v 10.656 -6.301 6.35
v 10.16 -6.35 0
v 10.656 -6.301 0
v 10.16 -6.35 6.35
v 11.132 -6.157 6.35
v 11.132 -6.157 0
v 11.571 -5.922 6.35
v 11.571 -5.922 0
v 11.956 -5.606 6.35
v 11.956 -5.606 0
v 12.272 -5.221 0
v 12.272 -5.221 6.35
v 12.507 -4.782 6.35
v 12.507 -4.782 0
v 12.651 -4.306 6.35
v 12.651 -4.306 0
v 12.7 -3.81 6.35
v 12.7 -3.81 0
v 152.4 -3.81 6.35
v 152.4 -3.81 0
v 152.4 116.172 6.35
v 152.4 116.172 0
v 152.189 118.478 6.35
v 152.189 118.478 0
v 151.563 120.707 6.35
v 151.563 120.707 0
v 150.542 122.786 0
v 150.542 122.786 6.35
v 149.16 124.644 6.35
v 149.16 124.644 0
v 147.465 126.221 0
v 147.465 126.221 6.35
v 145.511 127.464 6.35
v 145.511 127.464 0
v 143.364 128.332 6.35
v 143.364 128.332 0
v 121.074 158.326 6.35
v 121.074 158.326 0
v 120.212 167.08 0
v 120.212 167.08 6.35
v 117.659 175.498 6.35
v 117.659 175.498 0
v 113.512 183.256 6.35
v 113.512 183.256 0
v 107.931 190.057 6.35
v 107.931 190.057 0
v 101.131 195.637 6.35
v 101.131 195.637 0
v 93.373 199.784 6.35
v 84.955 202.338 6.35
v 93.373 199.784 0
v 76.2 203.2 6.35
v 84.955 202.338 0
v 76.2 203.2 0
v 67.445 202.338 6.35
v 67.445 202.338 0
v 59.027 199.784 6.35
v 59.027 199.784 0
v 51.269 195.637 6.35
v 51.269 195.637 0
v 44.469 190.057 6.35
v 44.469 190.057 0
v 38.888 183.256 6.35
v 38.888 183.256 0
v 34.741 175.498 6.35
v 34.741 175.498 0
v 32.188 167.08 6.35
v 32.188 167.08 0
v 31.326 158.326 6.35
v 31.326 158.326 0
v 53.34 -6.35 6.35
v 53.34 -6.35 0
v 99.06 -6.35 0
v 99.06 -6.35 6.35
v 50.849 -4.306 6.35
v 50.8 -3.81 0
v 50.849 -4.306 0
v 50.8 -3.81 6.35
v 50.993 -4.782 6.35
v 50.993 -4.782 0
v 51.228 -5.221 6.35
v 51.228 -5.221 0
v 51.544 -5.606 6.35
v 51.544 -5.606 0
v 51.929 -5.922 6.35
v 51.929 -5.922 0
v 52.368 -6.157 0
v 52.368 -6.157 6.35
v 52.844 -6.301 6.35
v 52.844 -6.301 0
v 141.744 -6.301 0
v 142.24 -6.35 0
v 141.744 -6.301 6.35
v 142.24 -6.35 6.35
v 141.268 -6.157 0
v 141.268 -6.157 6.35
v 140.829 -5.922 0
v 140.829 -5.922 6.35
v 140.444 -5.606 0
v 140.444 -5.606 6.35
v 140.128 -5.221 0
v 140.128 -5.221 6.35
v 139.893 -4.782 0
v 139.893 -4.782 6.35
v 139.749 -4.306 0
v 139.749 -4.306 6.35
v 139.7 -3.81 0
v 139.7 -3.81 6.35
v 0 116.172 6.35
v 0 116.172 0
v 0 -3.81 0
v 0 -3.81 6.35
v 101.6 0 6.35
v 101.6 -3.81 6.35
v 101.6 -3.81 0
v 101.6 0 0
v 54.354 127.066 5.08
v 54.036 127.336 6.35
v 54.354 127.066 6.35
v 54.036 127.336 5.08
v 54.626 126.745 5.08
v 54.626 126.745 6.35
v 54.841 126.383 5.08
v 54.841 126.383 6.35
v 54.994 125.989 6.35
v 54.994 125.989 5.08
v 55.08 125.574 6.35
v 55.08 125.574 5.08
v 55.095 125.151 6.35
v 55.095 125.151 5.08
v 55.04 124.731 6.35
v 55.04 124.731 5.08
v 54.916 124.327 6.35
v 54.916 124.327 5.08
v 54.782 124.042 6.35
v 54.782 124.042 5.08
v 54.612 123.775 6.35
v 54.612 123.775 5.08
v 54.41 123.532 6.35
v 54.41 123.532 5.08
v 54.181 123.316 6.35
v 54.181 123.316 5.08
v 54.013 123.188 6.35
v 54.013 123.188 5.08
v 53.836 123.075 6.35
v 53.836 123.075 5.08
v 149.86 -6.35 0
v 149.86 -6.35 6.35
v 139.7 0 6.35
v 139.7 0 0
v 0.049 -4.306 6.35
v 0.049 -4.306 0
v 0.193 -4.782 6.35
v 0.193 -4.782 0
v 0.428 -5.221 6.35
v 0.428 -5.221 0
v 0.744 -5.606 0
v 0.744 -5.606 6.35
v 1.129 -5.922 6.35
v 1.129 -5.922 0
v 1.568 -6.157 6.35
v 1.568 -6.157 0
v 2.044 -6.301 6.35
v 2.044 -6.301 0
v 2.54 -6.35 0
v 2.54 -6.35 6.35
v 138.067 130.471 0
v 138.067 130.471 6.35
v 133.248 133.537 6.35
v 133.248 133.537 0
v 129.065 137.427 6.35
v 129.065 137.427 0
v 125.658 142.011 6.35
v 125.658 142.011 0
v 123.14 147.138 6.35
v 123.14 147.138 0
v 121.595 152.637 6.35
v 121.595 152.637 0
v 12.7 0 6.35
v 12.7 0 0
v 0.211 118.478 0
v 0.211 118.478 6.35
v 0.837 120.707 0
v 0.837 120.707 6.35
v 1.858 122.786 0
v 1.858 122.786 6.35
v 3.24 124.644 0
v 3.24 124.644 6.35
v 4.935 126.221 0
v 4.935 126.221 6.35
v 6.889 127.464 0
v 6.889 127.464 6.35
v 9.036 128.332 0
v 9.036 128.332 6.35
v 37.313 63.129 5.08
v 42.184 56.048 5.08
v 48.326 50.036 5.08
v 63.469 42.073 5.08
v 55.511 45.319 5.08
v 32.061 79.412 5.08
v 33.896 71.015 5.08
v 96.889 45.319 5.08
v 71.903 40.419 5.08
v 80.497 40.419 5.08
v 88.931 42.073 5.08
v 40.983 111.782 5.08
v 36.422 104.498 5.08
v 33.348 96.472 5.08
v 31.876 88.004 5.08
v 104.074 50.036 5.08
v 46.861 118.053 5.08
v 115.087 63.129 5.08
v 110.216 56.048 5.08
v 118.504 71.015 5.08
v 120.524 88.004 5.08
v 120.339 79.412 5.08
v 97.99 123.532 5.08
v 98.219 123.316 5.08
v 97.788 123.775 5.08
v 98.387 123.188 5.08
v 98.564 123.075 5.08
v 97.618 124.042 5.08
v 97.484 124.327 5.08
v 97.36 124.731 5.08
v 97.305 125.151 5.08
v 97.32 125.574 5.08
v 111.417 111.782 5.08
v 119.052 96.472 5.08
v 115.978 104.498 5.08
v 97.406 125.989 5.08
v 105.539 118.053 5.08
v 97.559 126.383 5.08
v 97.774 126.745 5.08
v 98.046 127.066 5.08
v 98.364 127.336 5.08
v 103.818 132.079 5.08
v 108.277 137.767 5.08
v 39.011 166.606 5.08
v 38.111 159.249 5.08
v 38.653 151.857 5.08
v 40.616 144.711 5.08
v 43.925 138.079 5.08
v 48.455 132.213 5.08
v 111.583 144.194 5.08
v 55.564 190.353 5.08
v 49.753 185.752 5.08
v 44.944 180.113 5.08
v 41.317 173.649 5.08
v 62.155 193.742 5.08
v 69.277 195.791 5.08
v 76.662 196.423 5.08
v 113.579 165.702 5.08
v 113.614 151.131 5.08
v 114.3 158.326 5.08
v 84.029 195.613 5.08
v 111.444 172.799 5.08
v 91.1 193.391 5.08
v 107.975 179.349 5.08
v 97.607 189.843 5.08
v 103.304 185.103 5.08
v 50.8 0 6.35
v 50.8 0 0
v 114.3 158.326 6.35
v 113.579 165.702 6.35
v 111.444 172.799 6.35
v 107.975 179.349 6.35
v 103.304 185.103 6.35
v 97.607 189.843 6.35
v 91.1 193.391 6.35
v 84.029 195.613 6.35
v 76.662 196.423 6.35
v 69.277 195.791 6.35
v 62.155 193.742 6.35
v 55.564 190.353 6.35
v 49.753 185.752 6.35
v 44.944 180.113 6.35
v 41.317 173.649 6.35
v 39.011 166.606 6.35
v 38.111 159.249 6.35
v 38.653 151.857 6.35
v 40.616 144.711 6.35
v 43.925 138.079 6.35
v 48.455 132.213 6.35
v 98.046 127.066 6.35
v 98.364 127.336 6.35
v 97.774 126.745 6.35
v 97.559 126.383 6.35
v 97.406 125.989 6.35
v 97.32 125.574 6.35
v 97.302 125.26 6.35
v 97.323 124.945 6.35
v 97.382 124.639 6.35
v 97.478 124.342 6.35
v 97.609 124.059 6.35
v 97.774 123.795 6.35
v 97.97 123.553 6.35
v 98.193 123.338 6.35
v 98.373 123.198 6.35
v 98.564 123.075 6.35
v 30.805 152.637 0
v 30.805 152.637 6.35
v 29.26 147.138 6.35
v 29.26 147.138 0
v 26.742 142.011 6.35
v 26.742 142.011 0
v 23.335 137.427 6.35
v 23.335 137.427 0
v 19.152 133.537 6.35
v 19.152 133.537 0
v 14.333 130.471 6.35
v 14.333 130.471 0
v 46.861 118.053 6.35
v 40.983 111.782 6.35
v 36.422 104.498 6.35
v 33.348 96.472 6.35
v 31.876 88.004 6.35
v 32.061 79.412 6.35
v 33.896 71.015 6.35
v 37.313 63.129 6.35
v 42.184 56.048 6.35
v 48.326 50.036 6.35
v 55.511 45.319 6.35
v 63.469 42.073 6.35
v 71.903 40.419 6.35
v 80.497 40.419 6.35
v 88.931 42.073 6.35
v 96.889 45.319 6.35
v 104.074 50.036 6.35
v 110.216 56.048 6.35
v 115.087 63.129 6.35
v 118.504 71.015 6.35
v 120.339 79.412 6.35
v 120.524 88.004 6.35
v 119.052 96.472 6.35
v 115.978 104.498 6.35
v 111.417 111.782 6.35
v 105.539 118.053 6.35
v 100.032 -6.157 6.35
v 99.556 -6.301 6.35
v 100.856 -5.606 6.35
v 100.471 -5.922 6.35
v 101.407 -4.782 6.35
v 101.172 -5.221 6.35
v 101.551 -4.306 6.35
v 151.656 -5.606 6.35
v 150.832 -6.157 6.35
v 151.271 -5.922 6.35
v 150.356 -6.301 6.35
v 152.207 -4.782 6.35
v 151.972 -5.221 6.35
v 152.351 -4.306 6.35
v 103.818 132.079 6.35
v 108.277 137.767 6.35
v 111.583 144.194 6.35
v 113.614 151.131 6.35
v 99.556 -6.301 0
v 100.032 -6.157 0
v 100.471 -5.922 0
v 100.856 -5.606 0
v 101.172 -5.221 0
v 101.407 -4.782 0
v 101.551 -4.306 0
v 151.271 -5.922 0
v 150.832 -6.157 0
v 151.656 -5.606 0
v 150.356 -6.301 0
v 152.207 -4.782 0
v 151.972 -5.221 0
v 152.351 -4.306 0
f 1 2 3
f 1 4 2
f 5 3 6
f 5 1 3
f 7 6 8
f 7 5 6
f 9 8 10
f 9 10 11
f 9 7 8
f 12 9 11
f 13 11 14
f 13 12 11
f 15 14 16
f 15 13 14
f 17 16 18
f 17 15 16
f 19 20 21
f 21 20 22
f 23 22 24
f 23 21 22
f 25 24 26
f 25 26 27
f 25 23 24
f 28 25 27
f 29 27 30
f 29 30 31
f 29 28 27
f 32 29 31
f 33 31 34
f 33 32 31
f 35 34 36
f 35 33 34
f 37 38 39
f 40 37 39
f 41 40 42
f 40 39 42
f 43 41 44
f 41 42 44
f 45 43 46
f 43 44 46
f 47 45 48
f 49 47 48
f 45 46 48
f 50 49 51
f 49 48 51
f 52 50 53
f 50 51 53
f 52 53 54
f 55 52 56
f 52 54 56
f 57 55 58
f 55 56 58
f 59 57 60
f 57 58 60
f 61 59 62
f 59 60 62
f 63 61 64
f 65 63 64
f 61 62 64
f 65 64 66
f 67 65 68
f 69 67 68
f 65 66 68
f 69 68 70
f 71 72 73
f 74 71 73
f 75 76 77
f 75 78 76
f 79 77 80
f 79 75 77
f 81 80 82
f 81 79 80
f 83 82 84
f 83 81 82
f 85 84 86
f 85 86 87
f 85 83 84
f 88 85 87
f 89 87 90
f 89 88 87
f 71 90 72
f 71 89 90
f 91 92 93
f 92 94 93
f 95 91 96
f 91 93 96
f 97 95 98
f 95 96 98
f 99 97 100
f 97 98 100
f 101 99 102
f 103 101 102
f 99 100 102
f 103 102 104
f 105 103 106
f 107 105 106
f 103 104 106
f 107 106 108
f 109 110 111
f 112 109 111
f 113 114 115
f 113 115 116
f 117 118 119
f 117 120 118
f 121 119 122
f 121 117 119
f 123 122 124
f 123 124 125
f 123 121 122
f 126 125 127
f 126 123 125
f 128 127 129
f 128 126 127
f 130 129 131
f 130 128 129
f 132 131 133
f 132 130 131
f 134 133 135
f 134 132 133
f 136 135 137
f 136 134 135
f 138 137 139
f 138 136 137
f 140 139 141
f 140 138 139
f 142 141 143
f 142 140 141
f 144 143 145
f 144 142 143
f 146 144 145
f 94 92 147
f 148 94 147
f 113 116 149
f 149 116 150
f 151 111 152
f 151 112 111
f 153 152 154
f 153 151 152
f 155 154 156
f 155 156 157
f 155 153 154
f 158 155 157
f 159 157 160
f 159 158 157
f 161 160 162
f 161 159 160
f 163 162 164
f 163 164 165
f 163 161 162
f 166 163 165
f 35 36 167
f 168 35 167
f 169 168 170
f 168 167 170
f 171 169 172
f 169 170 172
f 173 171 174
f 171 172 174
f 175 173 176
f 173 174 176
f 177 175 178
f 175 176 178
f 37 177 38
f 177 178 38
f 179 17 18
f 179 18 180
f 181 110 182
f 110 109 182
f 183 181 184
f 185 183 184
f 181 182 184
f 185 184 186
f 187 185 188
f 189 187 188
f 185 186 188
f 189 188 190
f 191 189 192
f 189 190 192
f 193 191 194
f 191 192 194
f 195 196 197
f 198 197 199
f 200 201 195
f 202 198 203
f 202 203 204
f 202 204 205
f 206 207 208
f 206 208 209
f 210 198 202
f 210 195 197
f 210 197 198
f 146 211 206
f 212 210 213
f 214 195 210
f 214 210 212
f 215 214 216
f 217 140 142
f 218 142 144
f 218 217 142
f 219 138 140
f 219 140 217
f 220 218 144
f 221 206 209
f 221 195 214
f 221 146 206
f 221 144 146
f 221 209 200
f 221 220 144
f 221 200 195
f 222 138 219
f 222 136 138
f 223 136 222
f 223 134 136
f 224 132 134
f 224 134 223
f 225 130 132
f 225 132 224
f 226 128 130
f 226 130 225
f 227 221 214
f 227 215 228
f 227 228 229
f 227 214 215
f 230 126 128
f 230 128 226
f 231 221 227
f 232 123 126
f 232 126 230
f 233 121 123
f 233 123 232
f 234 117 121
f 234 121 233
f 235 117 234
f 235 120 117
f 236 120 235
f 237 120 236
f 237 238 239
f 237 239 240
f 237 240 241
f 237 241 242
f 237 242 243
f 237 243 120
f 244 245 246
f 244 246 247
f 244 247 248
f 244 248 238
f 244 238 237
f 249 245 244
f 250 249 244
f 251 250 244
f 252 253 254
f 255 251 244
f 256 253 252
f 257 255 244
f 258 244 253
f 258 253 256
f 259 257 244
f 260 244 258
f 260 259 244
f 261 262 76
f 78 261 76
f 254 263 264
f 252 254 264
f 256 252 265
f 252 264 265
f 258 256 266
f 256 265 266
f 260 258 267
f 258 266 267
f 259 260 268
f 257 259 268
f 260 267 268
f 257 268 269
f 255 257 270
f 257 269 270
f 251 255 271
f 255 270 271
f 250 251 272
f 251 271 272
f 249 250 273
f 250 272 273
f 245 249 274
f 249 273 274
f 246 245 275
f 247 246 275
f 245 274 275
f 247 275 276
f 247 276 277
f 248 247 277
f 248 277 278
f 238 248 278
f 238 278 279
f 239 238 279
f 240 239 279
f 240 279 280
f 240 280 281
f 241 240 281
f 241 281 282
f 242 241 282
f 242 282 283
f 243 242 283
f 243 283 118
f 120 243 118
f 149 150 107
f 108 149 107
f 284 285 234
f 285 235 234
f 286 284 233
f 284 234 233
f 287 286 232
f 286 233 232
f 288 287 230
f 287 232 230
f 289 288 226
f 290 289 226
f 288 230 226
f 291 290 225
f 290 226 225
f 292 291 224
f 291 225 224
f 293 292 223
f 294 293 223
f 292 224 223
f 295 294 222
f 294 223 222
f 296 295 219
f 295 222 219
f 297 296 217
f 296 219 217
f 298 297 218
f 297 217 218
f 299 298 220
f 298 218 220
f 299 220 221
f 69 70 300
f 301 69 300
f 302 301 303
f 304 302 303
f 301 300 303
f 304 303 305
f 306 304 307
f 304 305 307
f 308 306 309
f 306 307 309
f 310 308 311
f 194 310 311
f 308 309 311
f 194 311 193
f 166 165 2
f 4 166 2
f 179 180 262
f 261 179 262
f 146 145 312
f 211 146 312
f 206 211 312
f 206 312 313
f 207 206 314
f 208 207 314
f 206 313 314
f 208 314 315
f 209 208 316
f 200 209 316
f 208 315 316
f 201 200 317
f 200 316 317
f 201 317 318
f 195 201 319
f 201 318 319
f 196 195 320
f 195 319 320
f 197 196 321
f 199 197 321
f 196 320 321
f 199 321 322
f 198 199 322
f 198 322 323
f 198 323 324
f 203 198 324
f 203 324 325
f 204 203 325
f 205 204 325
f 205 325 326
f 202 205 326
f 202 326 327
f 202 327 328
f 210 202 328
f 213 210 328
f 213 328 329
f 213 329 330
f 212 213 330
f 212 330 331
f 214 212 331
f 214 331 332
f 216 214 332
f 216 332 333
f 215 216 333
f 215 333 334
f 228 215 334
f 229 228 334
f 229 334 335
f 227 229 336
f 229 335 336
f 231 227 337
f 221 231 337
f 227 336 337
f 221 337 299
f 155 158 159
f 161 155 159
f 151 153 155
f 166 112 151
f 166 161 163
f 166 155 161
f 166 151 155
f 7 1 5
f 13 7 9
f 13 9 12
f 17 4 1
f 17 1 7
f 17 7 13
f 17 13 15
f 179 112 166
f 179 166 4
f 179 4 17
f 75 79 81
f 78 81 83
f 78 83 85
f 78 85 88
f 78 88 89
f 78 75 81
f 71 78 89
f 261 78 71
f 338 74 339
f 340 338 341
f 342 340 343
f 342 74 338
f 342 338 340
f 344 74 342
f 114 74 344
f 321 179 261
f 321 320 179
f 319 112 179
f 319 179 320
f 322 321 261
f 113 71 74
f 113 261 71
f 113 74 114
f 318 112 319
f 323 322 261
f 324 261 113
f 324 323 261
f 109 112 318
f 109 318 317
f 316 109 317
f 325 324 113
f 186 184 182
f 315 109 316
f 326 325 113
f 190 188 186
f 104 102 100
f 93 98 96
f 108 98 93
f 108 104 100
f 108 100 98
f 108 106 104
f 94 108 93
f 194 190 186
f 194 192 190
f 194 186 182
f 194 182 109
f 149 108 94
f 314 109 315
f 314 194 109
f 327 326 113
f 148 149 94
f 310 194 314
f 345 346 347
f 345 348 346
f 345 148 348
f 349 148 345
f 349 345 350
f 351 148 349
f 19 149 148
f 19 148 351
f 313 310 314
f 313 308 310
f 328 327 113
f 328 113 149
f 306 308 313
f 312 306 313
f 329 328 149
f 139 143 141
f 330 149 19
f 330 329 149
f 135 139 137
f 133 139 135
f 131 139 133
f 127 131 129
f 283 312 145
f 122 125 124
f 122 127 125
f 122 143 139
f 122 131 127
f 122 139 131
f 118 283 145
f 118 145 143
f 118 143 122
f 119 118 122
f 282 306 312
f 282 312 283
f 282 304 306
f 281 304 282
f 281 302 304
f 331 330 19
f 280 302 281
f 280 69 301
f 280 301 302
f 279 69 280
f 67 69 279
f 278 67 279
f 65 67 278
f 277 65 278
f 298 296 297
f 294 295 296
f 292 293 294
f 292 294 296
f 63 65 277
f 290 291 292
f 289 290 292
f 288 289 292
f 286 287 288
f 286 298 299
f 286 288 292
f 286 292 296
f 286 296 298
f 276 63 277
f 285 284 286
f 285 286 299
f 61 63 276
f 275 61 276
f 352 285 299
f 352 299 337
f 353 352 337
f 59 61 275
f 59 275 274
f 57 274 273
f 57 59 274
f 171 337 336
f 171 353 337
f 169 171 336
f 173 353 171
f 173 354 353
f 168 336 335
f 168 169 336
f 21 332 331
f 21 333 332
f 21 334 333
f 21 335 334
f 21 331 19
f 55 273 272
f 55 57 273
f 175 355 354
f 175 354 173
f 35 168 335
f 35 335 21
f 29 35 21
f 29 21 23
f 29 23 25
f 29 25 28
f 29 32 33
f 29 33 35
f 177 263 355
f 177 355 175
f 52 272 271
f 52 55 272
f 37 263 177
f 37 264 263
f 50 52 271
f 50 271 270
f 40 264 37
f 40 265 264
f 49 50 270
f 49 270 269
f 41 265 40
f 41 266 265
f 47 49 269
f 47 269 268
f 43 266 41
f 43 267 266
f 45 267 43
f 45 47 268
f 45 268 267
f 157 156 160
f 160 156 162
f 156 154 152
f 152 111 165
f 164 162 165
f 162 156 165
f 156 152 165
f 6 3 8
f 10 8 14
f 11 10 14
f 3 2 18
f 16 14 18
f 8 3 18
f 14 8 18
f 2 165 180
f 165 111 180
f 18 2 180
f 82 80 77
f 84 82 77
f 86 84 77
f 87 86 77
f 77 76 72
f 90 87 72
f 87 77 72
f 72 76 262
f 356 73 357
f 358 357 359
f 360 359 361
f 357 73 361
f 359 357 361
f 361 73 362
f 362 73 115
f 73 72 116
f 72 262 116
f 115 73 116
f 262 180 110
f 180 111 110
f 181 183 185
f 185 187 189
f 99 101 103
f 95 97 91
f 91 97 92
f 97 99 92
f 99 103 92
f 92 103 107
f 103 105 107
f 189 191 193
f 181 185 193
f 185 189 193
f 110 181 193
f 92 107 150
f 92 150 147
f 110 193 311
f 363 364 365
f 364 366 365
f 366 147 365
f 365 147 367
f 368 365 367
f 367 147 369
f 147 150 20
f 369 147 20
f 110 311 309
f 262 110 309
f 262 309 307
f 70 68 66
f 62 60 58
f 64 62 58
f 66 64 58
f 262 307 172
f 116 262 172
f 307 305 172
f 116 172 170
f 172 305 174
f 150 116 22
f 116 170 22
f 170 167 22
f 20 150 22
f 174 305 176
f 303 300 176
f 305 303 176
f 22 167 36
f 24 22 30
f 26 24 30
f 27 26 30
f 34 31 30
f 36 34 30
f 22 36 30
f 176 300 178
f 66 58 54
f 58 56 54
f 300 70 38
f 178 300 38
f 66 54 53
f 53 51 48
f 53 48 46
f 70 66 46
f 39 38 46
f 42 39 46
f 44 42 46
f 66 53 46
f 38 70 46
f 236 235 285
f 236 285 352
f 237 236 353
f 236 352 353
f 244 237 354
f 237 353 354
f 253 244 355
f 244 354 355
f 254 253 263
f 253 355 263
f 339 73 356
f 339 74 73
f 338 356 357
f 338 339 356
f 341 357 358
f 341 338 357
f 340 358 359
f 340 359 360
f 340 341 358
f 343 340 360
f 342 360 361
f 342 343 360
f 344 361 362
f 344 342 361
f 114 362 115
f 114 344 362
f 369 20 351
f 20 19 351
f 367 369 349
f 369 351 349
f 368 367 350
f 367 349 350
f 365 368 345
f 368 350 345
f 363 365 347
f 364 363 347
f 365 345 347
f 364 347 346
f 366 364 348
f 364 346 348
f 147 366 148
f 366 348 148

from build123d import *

# Parameters (mm, degrees)
F1_DEPTH = 6.35
F2_R     = 12.7
F3_R     = 2.54
F5_DEPTH = 1.27
F6_R     = 2.54


# Not quite as in the source:
# - a feature names something its author has since deleted; it is built from what else it names


with BuildPart() as f1:
    # F0 (on Top) → F1 (new body)
    with BuildSketch(Plane.XY):
        with BuildLine():
            Line((0, 127), (0, 0))
            Line((0, 0), (0, -6.35))
            Line((0, -6.35), (12.7, -6.35))
            Line((12.7, -6.35), (12.7, 0))
            Line((12.7, 0), (50.8, 0))
            Line((50.8, 0), (50.8, -6.35))
            Line((50.8, -6.35), (101.6, -6.35))
            Line((101.6, -6.35), (101.6, 0))
            Line((101.6, 0), (139.7, 0))
            Line((139.7, 0), (139.7, -6.35))
            Line((139.7, -6.35), (152.4, -6.35))
            Line((152.4, -6.35), (152.4, 0))
            Line((152.4, 0), (152.4, 127))
            ThreePointArc((152.4, 127), (130.249490442, 136.1750414724), (121.0744489697, 158.3255510303))
            ThreePointArc((121.0744489697, 158.3255510303), (76.2, 203.2), (31.3255510303, 158.3255510303))
            ThreePointArc((31.3255510303, 158.3255510303), (22.150509558, 136.1750414724), (0, 127))
        make_face()
    extrude(amount=F1_DEPTH)

    # F2
    f2_edges = [f1.edges().sort_by_distance(p)[0] for p in [
        (0, 127, 3.175),
        (152.4, 127, 3.175),
    ]]
    fillet(f2_edges, radius=F2_R)

    # F3
    f3_edges = [f1.edges().sort_by_distance(p)[0] for p in [
        (0, -6.35, 3.175),
        (12.7, -6.35, 3.175),
        (50.8, -6.35, 3.175),
        (101.6, -6.35, 3.175),
        (139.7, -6.35, 3.175),
        (152.4, -6.35, 3.175),
    ]]
    fillet(f3_edges, radius=F3_R)

    # F4 (on face) → F5 (cut)
    with BuildSketch(Plane.XY.offset(6.35)):
        with BuildLine():
            ThreePointArc((94.7584962883, 125.0510530549), (109.0533766041, 139.0313641932), (114.3, 158.3255510303))
            ThreePointArc((114.3, 158.3255510303), (56.9058131628, 191.1789276345), (57.6415037117, 125.0510530549))
            ThreePointArc((57.6415037117, 125.0510530549), (76.2, 129.1106492996), (94.7584962883, 125.0510530549))
        make_face()
        with BuildLine():
            ThreePointArc((94.7584962883, 125.0510530549), (76.2, 120.2255510303), (57.6415037117, 125.0510530549))
            ThreePointArc((57.6415037117, 125.0510530549), (52.2116972257, 47.2392138647), (120.65, 84.6606492996))
            ThreePointArc((120.65, 84.6606492996), (113.6214354349, 108.6489520739), (94.7584962883, 125.0510530549))
        make_face()
        with BuildLine():
            ThreePointArc((94.7584962883, 125.0510530549), (76.2, 129.1106492996), (57.6415037117, 125.0510530549))
            ThreePointArc((57.6415037117, 125.0510530549), (76.2, 120.2255510303), (94.7584962883, 125.0510530549))
        make_face()
    extrude(amount=-F5_DEPTH, mode=Mode.SUBTRACT)

    # F6
    f6_edges = [f1.edges().sort_by_distance(p)[0] for p in [
        (57.641504, 125.051053, 5.715),
        (94.758496, 125.051053, 5.715),
    ]]
    fillet(f6_edges, radius=F6_R)


solid = f1.part
